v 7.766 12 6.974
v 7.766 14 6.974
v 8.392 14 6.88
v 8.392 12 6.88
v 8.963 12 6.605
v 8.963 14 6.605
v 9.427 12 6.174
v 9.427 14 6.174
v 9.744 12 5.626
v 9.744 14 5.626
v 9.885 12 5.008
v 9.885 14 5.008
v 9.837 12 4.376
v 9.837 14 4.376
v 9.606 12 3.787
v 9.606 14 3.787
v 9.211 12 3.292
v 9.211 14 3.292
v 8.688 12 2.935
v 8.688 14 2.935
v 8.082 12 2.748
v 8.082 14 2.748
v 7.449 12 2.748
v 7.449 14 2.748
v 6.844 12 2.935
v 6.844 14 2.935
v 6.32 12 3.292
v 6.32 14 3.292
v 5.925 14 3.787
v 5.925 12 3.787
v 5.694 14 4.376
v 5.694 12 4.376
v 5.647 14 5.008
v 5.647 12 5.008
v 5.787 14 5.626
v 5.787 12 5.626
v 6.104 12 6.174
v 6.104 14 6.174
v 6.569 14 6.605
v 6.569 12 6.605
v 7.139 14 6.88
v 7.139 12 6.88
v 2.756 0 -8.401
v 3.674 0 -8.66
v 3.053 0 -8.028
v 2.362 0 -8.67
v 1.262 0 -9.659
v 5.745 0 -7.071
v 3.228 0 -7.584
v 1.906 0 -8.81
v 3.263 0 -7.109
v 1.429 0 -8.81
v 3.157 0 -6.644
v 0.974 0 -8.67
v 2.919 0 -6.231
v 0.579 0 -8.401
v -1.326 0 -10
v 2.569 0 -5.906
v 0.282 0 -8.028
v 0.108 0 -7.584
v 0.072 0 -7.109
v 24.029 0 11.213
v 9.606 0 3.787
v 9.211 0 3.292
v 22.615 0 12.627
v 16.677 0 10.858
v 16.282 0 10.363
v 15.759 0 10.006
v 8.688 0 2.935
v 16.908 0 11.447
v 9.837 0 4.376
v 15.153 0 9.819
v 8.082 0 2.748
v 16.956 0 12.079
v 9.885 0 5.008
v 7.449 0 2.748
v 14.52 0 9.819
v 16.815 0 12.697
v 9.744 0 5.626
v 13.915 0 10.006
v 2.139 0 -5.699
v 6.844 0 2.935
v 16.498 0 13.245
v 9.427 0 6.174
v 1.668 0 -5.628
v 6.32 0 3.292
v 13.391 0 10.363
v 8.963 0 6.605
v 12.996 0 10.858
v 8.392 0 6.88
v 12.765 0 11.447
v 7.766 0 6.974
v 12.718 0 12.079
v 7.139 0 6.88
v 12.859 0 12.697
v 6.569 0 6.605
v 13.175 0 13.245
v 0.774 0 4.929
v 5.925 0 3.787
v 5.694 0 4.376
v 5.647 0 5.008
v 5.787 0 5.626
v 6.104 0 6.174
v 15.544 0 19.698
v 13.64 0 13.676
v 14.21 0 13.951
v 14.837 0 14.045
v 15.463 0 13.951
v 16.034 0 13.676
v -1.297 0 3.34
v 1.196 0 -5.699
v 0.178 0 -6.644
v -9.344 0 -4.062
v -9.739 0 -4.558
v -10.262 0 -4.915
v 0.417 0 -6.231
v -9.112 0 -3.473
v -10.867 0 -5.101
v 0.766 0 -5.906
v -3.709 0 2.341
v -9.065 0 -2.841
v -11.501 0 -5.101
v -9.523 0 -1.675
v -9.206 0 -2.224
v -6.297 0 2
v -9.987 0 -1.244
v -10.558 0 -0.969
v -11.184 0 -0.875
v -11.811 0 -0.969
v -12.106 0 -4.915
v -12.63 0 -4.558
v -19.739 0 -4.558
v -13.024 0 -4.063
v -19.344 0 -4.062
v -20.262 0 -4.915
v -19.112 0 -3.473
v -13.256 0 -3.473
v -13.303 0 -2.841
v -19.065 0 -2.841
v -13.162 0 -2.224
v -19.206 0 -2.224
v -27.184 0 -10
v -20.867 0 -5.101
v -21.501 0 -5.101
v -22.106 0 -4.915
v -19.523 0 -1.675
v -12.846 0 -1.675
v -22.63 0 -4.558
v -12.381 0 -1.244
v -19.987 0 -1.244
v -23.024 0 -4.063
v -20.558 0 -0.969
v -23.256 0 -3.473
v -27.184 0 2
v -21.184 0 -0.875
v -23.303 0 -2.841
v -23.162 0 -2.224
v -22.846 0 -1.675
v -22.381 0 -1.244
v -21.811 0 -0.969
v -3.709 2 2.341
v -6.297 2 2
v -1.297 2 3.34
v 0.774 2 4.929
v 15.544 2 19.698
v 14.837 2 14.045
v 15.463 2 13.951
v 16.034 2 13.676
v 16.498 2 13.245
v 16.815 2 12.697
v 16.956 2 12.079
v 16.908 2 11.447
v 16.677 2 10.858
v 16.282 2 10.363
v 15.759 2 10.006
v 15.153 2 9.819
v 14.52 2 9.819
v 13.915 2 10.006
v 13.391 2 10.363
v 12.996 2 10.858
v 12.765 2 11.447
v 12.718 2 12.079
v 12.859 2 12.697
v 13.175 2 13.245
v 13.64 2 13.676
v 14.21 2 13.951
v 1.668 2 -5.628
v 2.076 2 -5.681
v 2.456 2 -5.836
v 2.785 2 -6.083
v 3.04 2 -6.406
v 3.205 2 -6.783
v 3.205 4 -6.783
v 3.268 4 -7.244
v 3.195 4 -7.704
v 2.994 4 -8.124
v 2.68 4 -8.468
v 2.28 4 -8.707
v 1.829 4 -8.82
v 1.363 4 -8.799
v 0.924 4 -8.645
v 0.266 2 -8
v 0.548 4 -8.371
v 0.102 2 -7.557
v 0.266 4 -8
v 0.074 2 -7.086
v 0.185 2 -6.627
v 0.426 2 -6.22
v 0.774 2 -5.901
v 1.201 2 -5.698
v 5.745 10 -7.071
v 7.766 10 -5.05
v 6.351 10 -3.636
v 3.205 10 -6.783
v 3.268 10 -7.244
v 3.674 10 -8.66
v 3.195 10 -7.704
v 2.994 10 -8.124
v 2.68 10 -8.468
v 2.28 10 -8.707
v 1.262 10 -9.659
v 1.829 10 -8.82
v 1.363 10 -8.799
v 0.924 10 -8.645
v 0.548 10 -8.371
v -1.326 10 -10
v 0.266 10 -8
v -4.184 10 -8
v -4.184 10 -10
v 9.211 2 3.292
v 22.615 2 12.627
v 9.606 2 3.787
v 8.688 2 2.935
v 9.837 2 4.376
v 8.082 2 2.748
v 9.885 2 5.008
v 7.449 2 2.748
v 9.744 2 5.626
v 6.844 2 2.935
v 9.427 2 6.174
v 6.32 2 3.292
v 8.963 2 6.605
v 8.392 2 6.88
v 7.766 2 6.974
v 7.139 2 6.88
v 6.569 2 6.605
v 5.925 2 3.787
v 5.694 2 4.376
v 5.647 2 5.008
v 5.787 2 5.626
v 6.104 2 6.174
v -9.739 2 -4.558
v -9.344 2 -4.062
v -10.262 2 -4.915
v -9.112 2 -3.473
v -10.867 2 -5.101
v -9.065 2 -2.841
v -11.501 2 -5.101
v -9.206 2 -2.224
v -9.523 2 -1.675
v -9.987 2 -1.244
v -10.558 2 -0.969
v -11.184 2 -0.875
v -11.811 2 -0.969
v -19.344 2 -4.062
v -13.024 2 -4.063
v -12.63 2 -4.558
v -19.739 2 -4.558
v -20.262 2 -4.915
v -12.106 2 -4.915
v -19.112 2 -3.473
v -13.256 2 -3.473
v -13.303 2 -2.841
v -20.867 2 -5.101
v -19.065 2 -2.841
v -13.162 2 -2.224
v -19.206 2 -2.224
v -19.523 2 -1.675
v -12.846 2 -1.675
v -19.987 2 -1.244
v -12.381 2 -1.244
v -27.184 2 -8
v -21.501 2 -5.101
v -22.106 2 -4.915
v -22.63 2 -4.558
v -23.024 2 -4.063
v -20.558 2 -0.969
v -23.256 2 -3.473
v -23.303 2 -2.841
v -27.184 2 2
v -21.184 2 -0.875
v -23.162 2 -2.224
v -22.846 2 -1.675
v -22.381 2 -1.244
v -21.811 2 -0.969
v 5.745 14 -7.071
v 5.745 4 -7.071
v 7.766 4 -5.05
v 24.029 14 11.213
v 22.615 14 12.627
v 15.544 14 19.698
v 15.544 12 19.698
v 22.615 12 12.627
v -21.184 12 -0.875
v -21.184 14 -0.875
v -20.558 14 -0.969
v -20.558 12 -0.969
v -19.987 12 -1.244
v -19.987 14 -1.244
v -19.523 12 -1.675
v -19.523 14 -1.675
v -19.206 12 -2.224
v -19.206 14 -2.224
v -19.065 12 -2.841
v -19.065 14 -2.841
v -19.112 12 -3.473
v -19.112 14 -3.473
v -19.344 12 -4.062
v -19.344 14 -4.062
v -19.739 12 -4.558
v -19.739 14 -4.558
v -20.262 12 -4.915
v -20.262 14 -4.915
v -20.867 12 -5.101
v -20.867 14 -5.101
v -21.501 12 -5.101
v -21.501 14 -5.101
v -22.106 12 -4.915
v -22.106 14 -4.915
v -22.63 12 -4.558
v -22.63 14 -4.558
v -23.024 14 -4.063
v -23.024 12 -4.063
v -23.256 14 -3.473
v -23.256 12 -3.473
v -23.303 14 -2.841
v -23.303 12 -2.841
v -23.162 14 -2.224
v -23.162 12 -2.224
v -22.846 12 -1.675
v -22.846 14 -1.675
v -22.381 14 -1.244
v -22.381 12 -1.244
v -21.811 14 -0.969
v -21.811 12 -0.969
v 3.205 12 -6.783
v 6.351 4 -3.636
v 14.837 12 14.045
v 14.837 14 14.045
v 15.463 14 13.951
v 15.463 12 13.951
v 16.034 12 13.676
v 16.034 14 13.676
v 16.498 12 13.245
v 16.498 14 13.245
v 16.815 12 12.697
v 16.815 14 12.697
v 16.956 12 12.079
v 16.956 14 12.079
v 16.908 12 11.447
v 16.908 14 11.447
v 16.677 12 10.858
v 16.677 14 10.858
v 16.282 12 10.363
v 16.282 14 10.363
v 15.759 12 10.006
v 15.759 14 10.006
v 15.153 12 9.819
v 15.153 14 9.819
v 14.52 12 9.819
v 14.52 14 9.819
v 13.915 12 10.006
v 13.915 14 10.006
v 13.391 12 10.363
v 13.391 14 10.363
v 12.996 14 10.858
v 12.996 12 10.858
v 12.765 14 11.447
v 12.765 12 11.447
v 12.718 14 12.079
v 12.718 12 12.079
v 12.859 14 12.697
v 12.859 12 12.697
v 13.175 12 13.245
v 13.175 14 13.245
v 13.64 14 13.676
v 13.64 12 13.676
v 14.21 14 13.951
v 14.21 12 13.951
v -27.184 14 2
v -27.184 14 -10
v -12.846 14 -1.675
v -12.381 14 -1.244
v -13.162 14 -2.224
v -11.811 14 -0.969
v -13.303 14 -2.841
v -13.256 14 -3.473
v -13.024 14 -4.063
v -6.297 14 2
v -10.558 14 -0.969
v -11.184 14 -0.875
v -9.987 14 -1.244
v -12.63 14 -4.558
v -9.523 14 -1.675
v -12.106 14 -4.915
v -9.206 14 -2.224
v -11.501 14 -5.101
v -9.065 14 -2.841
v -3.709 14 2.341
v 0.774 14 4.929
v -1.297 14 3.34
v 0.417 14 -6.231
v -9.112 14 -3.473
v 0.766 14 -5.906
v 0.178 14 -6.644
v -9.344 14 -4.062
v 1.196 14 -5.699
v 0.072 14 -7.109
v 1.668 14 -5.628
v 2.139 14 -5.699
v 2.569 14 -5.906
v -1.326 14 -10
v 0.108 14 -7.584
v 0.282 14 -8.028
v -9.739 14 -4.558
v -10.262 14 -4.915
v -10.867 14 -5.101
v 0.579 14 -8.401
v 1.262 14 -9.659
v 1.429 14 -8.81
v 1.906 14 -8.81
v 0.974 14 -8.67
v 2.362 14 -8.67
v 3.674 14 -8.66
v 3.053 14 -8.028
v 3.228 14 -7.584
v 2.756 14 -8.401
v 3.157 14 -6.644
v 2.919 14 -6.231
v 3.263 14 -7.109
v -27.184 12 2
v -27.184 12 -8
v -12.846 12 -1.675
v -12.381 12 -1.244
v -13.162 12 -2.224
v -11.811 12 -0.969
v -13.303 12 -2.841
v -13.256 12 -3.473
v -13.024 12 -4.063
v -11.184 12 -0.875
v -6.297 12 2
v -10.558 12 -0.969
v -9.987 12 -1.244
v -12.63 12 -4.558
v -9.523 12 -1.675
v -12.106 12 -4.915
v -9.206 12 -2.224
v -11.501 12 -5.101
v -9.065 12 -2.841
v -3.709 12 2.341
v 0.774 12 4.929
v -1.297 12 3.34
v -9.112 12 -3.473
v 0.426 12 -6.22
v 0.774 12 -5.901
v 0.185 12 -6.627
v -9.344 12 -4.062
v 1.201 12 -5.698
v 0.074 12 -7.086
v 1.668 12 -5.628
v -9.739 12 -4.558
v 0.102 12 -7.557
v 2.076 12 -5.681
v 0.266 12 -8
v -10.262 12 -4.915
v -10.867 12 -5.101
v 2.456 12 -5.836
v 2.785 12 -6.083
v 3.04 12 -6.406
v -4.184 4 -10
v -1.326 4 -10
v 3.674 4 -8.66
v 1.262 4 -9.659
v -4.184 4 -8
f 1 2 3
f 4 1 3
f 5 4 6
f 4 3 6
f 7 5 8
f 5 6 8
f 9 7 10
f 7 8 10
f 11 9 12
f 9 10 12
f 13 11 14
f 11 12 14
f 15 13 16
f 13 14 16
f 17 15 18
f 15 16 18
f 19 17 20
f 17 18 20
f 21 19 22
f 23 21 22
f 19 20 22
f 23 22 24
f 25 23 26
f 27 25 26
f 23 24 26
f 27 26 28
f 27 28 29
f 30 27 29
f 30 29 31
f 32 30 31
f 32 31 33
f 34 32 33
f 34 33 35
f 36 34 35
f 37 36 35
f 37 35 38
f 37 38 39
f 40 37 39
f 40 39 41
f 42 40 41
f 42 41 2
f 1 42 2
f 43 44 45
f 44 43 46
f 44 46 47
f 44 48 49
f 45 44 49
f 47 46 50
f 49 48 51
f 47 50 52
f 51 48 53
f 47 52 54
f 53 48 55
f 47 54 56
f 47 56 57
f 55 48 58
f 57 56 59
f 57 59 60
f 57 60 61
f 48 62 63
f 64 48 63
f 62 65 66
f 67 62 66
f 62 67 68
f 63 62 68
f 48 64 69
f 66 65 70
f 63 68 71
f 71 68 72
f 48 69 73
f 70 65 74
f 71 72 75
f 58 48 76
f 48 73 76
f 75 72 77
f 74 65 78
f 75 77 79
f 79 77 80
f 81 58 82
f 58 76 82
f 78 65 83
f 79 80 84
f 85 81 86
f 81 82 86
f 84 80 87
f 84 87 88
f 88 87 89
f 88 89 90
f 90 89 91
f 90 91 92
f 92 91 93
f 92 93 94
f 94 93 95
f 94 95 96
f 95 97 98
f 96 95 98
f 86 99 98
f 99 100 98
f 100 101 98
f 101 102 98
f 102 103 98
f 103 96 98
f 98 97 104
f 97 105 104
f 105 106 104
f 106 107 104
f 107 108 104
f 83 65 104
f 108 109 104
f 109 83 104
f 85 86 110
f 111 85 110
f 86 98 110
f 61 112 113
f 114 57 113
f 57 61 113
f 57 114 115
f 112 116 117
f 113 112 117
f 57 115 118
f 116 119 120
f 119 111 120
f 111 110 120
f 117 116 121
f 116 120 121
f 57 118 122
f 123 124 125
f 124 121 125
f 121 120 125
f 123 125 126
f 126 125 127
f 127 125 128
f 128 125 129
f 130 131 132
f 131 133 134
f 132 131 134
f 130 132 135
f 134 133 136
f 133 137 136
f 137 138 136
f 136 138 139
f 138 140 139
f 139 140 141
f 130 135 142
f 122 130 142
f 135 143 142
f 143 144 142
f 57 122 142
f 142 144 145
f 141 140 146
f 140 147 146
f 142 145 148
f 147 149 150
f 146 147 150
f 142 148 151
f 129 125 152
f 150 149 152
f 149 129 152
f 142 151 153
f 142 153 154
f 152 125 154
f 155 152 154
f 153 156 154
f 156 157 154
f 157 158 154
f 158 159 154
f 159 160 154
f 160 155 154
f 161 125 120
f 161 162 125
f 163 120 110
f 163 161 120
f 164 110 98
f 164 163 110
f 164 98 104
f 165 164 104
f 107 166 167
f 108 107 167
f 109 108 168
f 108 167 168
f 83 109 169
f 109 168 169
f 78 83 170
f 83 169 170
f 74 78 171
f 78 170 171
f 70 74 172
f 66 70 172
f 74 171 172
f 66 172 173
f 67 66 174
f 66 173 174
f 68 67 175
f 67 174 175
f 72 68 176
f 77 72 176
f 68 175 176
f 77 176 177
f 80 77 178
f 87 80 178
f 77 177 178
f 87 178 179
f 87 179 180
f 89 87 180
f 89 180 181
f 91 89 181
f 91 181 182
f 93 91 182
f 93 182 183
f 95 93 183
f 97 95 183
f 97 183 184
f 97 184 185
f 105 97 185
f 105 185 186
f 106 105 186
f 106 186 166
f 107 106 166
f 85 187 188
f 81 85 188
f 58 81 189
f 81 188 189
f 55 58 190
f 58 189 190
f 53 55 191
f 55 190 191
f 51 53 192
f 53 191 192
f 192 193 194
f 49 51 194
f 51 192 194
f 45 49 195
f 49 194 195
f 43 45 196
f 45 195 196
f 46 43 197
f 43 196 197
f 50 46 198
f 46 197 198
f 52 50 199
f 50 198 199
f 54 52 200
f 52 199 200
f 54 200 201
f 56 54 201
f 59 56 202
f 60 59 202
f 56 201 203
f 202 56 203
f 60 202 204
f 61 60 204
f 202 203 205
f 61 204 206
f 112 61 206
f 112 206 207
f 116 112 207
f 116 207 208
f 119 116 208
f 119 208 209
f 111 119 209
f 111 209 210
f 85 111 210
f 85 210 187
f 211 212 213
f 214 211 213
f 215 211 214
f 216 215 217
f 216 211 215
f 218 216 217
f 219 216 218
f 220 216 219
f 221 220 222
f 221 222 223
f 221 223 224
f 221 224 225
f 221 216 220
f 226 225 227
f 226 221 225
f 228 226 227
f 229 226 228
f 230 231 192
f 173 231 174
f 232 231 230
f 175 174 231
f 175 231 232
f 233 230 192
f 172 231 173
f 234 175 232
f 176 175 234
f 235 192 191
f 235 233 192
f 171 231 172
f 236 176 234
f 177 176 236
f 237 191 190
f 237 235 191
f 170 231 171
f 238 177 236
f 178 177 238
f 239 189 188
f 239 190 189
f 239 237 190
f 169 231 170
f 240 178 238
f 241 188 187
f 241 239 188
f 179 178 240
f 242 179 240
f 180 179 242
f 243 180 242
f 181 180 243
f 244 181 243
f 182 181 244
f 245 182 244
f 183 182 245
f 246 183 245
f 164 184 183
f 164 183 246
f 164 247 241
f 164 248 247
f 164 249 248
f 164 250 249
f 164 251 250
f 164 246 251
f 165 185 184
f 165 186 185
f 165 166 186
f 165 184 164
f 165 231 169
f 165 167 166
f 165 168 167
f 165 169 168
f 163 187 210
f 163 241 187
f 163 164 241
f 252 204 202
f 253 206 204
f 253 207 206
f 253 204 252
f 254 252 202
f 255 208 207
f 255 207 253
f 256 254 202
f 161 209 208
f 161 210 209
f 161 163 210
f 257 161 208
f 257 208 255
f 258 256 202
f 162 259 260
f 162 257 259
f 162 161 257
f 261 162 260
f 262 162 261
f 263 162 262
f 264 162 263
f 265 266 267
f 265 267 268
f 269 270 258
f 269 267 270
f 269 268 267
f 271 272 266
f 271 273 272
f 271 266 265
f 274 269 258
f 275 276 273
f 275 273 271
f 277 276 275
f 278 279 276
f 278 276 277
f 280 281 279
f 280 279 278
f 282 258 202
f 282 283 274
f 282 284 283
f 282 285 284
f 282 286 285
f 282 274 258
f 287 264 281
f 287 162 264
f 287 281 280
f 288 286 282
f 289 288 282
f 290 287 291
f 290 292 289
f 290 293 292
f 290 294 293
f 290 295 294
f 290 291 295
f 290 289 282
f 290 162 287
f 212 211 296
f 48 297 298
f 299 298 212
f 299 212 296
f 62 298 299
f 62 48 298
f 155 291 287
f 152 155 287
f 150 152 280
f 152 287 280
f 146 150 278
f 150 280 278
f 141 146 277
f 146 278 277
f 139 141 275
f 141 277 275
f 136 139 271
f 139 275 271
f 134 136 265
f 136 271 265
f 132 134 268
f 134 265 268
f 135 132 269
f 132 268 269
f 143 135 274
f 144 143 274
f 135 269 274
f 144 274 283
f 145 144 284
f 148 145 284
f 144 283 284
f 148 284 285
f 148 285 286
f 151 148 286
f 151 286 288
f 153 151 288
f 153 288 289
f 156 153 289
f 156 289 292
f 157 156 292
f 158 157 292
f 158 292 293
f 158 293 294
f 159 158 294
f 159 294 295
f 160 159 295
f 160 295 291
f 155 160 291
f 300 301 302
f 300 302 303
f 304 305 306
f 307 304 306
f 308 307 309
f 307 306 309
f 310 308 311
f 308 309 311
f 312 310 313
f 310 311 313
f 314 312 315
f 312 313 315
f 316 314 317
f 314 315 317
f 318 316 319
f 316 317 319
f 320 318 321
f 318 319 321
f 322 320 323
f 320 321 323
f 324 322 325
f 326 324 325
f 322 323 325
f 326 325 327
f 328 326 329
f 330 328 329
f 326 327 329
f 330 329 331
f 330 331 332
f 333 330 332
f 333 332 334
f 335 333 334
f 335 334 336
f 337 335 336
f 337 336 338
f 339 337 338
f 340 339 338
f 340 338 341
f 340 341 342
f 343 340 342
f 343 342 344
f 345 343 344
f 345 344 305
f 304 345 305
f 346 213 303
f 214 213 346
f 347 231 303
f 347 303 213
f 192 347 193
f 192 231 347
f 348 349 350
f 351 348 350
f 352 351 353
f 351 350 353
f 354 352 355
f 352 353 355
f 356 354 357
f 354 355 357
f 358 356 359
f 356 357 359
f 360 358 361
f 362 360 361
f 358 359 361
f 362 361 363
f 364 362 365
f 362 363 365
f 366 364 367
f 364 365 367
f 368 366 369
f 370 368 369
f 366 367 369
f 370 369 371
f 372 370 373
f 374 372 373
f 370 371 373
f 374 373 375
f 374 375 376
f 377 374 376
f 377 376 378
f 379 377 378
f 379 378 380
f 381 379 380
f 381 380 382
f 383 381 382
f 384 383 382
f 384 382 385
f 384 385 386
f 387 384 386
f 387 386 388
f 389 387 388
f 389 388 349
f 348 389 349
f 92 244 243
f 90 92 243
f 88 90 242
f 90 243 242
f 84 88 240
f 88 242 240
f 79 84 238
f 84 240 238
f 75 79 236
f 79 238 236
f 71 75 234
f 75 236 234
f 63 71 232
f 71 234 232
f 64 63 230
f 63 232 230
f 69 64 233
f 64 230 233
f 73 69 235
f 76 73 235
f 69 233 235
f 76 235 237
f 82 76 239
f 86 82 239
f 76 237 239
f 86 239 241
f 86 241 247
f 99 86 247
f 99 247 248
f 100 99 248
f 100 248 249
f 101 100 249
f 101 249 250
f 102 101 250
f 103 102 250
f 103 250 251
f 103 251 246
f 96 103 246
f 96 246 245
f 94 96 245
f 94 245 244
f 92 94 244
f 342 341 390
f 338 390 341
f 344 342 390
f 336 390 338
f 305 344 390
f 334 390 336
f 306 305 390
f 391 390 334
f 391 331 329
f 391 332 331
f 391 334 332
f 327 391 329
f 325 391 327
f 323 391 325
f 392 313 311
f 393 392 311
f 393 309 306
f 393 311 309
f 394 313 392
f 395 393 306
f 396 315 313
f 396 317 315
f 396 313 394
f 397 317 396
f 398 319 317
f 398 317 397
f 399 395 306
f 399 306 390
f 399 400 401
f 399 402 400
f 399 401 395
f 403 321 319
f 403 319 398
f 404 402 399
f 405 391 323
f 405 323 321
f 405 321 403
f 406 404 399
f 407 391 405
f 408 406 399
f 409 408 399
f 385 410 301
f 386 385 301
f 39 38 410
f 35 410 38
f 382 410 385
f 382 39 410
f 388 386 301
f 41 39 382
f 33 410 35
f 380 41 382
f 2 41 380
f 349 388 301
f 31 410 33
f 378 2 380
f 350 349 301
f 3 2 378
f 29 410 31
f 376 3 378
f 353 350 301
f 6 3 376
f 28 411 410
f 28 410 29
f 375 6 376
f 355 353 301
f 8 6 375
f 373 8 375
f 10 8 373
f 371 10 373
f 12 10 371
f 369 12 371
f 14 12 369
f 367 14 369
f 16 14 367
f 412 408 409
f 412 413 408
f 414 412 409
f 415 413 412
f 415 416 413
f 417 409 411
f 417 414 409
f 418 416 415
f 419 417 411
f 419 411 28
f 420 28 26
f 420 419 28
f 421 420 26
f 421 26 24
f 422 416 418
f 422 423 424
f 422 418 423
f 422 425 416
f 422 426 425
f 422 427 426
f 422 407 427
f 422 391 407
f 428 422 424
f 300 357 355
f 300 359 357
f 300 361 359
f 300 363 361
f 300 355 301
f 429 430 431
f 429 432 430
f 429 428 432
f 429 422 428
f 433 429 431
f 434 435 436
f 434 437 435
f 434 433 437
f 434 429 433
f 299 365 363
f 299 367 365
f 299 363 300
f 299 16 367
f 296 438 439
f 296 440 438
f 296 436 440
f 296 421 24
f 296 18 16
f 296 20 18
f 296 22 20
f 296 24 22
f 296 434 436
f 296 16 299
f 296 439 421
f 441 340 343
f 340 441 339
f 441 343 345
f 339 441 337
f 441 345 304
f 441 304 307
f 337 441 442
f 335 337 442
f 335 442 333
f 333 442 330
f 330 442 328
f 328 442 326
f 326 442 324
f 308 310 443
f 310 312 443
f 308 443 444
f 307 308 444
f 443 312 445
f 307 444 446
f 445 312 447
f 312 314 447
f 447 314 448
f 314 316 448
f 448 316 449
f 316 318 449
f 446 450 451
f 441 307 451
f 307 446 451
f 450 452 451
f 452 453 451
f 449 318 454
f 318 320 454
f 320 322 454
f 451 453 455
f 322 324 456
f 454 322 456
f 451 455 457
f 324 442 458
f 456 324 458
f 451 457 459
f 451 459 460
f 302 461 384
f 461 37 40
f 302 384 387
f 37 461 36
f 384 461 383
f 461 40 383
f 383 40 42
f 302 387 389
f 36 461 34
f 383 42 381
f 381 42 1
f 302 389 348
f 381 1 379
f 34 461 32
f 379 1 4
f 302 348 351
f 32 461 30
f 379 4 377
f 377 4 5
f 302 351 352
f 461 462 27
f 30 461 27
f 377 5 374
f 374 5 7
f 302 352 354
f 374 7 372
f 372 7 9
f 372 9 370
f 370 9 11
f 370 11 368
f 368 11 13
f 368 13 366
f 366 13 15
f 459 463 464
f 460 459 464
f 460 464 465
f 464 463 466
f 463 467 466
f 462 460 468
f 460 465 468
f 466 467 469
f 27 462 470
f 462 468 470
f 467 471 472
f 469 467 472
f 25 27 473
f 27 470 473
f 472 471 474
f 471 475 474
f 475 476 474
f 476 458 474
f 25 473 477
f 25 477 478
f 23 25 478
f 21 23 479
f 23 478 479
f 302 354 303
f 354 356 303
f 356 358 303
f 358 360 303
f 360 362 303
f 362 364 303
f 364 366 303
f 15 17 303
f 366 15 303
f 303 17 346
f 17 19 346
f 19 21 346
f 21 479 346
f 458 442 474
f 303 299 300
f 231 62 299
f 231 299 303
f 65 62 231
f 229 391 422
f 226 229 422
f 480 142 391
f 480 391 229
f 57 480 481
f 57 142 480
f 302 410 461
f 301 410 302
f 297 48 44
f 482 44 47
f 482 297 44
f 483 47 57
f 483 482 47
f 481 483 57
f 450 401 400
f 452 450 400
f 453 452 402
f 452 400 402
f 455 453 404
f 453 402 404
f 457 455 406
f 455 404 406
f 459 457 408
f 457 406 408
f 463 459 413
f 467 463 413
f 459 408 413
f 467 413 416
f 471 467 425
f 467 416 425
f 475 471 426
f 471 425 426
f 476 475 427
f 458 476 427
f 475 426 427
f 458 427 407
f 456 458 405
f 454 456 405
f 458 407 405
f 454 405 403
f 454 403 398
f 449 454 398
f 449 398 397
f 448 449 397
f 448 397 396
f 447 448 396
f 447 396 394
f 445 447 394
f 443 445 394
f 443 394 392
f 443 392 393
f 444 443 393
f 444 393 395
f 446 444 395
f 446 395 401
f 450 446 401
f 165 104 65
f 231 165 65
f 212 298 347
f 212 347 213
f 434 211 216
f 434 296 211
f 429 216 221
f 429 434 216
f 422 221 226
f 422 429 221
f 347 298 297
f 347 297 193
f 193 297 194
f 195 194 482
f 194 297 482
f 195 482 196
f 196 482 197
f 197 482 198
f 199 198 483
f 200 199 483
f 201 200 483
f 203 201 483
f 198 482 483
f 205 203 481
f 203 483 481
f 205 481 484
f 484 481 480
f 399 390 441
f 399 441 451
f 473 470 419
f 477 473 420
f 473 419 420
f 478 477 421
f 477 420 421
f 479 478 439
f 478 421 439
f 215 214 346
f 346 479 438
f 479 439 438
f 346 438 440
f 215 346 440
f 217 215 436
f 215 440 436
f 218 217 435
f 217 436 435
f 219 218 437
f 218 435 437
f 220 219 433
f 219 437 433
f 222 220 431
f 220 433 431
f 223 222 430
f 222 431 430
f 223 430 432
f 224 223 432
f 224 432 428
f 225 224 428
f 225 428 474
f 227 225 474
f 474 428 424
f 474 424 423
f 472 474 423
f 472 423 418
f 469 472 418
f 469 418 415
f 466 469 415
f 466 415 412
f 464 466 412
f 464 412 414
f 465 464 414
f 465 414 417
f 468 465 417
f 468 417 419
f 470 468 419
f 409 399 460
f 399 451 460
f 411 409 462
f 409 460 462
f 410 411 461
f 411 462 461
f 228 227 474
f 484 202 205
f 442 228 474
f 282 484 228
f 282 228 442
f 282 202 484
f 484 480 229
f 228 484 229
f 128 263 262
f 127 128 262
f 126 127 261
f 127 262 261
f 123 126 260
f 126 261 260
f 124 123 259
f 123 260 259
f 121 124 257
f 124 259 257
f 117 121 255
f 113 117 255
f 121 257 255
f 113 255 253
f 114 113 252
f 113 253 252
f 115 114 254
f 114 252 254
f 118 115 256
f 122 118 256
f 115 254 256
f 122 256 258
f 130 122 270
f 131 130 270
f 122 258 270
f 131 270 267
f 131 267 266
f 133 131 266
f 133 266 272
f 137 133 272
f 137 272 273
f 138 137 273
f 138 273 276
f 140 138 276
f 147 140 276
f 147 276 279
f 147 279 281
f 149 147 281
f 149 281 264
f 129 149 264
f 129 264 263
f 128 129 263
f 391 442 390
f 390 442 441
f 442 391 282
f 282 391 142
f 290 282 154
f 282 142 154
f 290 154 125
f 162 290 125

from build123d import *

# Parameters (mm, degrees)
BOSS_EXTRUDE1_DEPTH = 14
BOSS_EXTRUDE2_DEPTH = 2
BOSS_EXTRUDE3_DEPTH = 2
SKETCH4_R           = 2.125
CUT_EXTRUDE1_DEPTH  = 15
SKETCH5_R           = 1.6
CUT_EXTRUDE2_DEPTH  = 15
SKETCH6_W           = 7
SKETCH6_H           = 6
CUT_EXTRUDE3_DEPTH  = 15
SKETCH7_W           = 7
SKETCH7_H           = 6
CUT_EXTRUDE4_DEPTH  = 15
FILLET2_R           = 10
FILLET3_R           = 10


with BuildPart() as part:
    # Sketch1 → Boss-Extrude1 (new body)
    with BuildSketch(Plane(origin=(0, 0, 0), x_dir=(1, 0, 0), z_dir=(0, 1, 0))):
        Polygon((-27.184182145, 10), (2.815817855, 10), (24.029021291, -11.213203436), (22.614807728, -12.627416998), (1.98739073, 8), (-27.184182145, 8), align=None)
    extrude(amount=BOSS_EXTRUDE1_DEPTH)

    # Sketch2 → Boss-Extrude2 (add)
    with BuildSketch(Plane(origin=(0, 14, 0), x_dir=(1, 0, 0), z_dir=(0, 1, 0))):
        Polygon((-27.184182145, 8), (-27.184182145, -2), (-2.154744893, -2), (15.543739917, -19.69848481), (22.614807728, -12.627416998), (1.98739073, 8), align=None)
    extrude(amount=-BOSS_EXTRUDE2_DEPTH)

    # Sketch3 → Boss-Extrude3 (add)
    with BuildSketch(Plane.XZ):
        Polygon((-27.184182145, -8), (-27.184182145, 2), (-2.154744893, 2), (15.543739917, 19.69848481), (22.614807728, 12.627416998), (1.98739073, -8), align=None)
    extrude(amount=-BOSS_EXTRUDE3_DEPTH)

    # Sketch4 → Cut-Extrude1 (cut)
    with BuildSketch(Plane(origin=(0, 14, 0), x_dir=(1, 0, 0), z_dir=(0, 1, 0))):
        with Locations(Location((-21.184182145, 3, 0), (0, 0, 270))):
            Circle(SKETCH4_R)
        with Locations(Location((-11.184182145, 3, 0), (0, 0, 270))):
            Circle(SKETCH4_R)
        with Locations(Location((7.765565323, -4.849242405, 0), (0, 0, 270))):
            Circle(SKETCH4_R)
        with Locations(Location((14.836633135, -11.920310217, 0), (0, 0, 270))):
            Circle(SKETCH4_R)
    extrude(amount=-CUT_EXTRUDE1_DEPTH, mode=Mode.SUBTRACT)

    # Sketch5 → Cut-Extrude2 (cut)
    with BuildSketch(Plane(origin=(0, 14, 0), x_dir=(1, 0, 0), z_dir=(0, 1, 0))):
        with Locations(Location((1.667767558, 7.228361402, 0), (0, 0, 270))):
            Circle(SKETCH5_R)
    extrude(amount=-CUT_EXTRUDE2_DEPTH, mode=Mode.SUBTRACT)

    # Sketch6 → Cut-Extrude3 (cut)
    with BuildSketch(Plane(origin=(0, 0, -10), x_dir=(-1, 0, 0), z_dir=(0, 0, -1))):
        with Locations((0.684182145, 7)):
            Rectangle(SKETCH6_W, SKETCH6_H)
    extrude(amount=-CUT_EXTRUDE3_DEPTH, mode=Mode.SUBTRACT)

    # Sketch7 → Cut-Extrude4 (cut)
    with BuildSketch(Plane(origin=(6.407908928, 0, -6.407908928), x_dir=(-0.7071067811865465, 0, -0.7071067811865487), z_dir=(0.7071067811865487, 0, -0.7071067811865465))):
        with Locations((1.579983912, 7)):
            Rectangle(SKETCH7_W, SKETCH7_H)
    extrude(amount=-CUT_EXTRUDE4_DEPTH, mode=Mode.SUBTRACT)

    # Fillet2
    fillet2_edges = [part.edges().sort_by_distance(p)[0] for p in [
        (2.815817855, 2, -10),
        (2.815817855, 12, -10),
    ]]
    fillet(fillet2_edges, radius=FILLET2_R)

    # Fillet3
    fillet3_edges = [part.edges().sort_by_distance(p)[0] for p in [
        (-2.154744893, 13, 2),
        (-2.154744893, 1, 2),
    ]]
    fillet(fillet3_edges, radius=FILLET3_R)


solid = part.part
